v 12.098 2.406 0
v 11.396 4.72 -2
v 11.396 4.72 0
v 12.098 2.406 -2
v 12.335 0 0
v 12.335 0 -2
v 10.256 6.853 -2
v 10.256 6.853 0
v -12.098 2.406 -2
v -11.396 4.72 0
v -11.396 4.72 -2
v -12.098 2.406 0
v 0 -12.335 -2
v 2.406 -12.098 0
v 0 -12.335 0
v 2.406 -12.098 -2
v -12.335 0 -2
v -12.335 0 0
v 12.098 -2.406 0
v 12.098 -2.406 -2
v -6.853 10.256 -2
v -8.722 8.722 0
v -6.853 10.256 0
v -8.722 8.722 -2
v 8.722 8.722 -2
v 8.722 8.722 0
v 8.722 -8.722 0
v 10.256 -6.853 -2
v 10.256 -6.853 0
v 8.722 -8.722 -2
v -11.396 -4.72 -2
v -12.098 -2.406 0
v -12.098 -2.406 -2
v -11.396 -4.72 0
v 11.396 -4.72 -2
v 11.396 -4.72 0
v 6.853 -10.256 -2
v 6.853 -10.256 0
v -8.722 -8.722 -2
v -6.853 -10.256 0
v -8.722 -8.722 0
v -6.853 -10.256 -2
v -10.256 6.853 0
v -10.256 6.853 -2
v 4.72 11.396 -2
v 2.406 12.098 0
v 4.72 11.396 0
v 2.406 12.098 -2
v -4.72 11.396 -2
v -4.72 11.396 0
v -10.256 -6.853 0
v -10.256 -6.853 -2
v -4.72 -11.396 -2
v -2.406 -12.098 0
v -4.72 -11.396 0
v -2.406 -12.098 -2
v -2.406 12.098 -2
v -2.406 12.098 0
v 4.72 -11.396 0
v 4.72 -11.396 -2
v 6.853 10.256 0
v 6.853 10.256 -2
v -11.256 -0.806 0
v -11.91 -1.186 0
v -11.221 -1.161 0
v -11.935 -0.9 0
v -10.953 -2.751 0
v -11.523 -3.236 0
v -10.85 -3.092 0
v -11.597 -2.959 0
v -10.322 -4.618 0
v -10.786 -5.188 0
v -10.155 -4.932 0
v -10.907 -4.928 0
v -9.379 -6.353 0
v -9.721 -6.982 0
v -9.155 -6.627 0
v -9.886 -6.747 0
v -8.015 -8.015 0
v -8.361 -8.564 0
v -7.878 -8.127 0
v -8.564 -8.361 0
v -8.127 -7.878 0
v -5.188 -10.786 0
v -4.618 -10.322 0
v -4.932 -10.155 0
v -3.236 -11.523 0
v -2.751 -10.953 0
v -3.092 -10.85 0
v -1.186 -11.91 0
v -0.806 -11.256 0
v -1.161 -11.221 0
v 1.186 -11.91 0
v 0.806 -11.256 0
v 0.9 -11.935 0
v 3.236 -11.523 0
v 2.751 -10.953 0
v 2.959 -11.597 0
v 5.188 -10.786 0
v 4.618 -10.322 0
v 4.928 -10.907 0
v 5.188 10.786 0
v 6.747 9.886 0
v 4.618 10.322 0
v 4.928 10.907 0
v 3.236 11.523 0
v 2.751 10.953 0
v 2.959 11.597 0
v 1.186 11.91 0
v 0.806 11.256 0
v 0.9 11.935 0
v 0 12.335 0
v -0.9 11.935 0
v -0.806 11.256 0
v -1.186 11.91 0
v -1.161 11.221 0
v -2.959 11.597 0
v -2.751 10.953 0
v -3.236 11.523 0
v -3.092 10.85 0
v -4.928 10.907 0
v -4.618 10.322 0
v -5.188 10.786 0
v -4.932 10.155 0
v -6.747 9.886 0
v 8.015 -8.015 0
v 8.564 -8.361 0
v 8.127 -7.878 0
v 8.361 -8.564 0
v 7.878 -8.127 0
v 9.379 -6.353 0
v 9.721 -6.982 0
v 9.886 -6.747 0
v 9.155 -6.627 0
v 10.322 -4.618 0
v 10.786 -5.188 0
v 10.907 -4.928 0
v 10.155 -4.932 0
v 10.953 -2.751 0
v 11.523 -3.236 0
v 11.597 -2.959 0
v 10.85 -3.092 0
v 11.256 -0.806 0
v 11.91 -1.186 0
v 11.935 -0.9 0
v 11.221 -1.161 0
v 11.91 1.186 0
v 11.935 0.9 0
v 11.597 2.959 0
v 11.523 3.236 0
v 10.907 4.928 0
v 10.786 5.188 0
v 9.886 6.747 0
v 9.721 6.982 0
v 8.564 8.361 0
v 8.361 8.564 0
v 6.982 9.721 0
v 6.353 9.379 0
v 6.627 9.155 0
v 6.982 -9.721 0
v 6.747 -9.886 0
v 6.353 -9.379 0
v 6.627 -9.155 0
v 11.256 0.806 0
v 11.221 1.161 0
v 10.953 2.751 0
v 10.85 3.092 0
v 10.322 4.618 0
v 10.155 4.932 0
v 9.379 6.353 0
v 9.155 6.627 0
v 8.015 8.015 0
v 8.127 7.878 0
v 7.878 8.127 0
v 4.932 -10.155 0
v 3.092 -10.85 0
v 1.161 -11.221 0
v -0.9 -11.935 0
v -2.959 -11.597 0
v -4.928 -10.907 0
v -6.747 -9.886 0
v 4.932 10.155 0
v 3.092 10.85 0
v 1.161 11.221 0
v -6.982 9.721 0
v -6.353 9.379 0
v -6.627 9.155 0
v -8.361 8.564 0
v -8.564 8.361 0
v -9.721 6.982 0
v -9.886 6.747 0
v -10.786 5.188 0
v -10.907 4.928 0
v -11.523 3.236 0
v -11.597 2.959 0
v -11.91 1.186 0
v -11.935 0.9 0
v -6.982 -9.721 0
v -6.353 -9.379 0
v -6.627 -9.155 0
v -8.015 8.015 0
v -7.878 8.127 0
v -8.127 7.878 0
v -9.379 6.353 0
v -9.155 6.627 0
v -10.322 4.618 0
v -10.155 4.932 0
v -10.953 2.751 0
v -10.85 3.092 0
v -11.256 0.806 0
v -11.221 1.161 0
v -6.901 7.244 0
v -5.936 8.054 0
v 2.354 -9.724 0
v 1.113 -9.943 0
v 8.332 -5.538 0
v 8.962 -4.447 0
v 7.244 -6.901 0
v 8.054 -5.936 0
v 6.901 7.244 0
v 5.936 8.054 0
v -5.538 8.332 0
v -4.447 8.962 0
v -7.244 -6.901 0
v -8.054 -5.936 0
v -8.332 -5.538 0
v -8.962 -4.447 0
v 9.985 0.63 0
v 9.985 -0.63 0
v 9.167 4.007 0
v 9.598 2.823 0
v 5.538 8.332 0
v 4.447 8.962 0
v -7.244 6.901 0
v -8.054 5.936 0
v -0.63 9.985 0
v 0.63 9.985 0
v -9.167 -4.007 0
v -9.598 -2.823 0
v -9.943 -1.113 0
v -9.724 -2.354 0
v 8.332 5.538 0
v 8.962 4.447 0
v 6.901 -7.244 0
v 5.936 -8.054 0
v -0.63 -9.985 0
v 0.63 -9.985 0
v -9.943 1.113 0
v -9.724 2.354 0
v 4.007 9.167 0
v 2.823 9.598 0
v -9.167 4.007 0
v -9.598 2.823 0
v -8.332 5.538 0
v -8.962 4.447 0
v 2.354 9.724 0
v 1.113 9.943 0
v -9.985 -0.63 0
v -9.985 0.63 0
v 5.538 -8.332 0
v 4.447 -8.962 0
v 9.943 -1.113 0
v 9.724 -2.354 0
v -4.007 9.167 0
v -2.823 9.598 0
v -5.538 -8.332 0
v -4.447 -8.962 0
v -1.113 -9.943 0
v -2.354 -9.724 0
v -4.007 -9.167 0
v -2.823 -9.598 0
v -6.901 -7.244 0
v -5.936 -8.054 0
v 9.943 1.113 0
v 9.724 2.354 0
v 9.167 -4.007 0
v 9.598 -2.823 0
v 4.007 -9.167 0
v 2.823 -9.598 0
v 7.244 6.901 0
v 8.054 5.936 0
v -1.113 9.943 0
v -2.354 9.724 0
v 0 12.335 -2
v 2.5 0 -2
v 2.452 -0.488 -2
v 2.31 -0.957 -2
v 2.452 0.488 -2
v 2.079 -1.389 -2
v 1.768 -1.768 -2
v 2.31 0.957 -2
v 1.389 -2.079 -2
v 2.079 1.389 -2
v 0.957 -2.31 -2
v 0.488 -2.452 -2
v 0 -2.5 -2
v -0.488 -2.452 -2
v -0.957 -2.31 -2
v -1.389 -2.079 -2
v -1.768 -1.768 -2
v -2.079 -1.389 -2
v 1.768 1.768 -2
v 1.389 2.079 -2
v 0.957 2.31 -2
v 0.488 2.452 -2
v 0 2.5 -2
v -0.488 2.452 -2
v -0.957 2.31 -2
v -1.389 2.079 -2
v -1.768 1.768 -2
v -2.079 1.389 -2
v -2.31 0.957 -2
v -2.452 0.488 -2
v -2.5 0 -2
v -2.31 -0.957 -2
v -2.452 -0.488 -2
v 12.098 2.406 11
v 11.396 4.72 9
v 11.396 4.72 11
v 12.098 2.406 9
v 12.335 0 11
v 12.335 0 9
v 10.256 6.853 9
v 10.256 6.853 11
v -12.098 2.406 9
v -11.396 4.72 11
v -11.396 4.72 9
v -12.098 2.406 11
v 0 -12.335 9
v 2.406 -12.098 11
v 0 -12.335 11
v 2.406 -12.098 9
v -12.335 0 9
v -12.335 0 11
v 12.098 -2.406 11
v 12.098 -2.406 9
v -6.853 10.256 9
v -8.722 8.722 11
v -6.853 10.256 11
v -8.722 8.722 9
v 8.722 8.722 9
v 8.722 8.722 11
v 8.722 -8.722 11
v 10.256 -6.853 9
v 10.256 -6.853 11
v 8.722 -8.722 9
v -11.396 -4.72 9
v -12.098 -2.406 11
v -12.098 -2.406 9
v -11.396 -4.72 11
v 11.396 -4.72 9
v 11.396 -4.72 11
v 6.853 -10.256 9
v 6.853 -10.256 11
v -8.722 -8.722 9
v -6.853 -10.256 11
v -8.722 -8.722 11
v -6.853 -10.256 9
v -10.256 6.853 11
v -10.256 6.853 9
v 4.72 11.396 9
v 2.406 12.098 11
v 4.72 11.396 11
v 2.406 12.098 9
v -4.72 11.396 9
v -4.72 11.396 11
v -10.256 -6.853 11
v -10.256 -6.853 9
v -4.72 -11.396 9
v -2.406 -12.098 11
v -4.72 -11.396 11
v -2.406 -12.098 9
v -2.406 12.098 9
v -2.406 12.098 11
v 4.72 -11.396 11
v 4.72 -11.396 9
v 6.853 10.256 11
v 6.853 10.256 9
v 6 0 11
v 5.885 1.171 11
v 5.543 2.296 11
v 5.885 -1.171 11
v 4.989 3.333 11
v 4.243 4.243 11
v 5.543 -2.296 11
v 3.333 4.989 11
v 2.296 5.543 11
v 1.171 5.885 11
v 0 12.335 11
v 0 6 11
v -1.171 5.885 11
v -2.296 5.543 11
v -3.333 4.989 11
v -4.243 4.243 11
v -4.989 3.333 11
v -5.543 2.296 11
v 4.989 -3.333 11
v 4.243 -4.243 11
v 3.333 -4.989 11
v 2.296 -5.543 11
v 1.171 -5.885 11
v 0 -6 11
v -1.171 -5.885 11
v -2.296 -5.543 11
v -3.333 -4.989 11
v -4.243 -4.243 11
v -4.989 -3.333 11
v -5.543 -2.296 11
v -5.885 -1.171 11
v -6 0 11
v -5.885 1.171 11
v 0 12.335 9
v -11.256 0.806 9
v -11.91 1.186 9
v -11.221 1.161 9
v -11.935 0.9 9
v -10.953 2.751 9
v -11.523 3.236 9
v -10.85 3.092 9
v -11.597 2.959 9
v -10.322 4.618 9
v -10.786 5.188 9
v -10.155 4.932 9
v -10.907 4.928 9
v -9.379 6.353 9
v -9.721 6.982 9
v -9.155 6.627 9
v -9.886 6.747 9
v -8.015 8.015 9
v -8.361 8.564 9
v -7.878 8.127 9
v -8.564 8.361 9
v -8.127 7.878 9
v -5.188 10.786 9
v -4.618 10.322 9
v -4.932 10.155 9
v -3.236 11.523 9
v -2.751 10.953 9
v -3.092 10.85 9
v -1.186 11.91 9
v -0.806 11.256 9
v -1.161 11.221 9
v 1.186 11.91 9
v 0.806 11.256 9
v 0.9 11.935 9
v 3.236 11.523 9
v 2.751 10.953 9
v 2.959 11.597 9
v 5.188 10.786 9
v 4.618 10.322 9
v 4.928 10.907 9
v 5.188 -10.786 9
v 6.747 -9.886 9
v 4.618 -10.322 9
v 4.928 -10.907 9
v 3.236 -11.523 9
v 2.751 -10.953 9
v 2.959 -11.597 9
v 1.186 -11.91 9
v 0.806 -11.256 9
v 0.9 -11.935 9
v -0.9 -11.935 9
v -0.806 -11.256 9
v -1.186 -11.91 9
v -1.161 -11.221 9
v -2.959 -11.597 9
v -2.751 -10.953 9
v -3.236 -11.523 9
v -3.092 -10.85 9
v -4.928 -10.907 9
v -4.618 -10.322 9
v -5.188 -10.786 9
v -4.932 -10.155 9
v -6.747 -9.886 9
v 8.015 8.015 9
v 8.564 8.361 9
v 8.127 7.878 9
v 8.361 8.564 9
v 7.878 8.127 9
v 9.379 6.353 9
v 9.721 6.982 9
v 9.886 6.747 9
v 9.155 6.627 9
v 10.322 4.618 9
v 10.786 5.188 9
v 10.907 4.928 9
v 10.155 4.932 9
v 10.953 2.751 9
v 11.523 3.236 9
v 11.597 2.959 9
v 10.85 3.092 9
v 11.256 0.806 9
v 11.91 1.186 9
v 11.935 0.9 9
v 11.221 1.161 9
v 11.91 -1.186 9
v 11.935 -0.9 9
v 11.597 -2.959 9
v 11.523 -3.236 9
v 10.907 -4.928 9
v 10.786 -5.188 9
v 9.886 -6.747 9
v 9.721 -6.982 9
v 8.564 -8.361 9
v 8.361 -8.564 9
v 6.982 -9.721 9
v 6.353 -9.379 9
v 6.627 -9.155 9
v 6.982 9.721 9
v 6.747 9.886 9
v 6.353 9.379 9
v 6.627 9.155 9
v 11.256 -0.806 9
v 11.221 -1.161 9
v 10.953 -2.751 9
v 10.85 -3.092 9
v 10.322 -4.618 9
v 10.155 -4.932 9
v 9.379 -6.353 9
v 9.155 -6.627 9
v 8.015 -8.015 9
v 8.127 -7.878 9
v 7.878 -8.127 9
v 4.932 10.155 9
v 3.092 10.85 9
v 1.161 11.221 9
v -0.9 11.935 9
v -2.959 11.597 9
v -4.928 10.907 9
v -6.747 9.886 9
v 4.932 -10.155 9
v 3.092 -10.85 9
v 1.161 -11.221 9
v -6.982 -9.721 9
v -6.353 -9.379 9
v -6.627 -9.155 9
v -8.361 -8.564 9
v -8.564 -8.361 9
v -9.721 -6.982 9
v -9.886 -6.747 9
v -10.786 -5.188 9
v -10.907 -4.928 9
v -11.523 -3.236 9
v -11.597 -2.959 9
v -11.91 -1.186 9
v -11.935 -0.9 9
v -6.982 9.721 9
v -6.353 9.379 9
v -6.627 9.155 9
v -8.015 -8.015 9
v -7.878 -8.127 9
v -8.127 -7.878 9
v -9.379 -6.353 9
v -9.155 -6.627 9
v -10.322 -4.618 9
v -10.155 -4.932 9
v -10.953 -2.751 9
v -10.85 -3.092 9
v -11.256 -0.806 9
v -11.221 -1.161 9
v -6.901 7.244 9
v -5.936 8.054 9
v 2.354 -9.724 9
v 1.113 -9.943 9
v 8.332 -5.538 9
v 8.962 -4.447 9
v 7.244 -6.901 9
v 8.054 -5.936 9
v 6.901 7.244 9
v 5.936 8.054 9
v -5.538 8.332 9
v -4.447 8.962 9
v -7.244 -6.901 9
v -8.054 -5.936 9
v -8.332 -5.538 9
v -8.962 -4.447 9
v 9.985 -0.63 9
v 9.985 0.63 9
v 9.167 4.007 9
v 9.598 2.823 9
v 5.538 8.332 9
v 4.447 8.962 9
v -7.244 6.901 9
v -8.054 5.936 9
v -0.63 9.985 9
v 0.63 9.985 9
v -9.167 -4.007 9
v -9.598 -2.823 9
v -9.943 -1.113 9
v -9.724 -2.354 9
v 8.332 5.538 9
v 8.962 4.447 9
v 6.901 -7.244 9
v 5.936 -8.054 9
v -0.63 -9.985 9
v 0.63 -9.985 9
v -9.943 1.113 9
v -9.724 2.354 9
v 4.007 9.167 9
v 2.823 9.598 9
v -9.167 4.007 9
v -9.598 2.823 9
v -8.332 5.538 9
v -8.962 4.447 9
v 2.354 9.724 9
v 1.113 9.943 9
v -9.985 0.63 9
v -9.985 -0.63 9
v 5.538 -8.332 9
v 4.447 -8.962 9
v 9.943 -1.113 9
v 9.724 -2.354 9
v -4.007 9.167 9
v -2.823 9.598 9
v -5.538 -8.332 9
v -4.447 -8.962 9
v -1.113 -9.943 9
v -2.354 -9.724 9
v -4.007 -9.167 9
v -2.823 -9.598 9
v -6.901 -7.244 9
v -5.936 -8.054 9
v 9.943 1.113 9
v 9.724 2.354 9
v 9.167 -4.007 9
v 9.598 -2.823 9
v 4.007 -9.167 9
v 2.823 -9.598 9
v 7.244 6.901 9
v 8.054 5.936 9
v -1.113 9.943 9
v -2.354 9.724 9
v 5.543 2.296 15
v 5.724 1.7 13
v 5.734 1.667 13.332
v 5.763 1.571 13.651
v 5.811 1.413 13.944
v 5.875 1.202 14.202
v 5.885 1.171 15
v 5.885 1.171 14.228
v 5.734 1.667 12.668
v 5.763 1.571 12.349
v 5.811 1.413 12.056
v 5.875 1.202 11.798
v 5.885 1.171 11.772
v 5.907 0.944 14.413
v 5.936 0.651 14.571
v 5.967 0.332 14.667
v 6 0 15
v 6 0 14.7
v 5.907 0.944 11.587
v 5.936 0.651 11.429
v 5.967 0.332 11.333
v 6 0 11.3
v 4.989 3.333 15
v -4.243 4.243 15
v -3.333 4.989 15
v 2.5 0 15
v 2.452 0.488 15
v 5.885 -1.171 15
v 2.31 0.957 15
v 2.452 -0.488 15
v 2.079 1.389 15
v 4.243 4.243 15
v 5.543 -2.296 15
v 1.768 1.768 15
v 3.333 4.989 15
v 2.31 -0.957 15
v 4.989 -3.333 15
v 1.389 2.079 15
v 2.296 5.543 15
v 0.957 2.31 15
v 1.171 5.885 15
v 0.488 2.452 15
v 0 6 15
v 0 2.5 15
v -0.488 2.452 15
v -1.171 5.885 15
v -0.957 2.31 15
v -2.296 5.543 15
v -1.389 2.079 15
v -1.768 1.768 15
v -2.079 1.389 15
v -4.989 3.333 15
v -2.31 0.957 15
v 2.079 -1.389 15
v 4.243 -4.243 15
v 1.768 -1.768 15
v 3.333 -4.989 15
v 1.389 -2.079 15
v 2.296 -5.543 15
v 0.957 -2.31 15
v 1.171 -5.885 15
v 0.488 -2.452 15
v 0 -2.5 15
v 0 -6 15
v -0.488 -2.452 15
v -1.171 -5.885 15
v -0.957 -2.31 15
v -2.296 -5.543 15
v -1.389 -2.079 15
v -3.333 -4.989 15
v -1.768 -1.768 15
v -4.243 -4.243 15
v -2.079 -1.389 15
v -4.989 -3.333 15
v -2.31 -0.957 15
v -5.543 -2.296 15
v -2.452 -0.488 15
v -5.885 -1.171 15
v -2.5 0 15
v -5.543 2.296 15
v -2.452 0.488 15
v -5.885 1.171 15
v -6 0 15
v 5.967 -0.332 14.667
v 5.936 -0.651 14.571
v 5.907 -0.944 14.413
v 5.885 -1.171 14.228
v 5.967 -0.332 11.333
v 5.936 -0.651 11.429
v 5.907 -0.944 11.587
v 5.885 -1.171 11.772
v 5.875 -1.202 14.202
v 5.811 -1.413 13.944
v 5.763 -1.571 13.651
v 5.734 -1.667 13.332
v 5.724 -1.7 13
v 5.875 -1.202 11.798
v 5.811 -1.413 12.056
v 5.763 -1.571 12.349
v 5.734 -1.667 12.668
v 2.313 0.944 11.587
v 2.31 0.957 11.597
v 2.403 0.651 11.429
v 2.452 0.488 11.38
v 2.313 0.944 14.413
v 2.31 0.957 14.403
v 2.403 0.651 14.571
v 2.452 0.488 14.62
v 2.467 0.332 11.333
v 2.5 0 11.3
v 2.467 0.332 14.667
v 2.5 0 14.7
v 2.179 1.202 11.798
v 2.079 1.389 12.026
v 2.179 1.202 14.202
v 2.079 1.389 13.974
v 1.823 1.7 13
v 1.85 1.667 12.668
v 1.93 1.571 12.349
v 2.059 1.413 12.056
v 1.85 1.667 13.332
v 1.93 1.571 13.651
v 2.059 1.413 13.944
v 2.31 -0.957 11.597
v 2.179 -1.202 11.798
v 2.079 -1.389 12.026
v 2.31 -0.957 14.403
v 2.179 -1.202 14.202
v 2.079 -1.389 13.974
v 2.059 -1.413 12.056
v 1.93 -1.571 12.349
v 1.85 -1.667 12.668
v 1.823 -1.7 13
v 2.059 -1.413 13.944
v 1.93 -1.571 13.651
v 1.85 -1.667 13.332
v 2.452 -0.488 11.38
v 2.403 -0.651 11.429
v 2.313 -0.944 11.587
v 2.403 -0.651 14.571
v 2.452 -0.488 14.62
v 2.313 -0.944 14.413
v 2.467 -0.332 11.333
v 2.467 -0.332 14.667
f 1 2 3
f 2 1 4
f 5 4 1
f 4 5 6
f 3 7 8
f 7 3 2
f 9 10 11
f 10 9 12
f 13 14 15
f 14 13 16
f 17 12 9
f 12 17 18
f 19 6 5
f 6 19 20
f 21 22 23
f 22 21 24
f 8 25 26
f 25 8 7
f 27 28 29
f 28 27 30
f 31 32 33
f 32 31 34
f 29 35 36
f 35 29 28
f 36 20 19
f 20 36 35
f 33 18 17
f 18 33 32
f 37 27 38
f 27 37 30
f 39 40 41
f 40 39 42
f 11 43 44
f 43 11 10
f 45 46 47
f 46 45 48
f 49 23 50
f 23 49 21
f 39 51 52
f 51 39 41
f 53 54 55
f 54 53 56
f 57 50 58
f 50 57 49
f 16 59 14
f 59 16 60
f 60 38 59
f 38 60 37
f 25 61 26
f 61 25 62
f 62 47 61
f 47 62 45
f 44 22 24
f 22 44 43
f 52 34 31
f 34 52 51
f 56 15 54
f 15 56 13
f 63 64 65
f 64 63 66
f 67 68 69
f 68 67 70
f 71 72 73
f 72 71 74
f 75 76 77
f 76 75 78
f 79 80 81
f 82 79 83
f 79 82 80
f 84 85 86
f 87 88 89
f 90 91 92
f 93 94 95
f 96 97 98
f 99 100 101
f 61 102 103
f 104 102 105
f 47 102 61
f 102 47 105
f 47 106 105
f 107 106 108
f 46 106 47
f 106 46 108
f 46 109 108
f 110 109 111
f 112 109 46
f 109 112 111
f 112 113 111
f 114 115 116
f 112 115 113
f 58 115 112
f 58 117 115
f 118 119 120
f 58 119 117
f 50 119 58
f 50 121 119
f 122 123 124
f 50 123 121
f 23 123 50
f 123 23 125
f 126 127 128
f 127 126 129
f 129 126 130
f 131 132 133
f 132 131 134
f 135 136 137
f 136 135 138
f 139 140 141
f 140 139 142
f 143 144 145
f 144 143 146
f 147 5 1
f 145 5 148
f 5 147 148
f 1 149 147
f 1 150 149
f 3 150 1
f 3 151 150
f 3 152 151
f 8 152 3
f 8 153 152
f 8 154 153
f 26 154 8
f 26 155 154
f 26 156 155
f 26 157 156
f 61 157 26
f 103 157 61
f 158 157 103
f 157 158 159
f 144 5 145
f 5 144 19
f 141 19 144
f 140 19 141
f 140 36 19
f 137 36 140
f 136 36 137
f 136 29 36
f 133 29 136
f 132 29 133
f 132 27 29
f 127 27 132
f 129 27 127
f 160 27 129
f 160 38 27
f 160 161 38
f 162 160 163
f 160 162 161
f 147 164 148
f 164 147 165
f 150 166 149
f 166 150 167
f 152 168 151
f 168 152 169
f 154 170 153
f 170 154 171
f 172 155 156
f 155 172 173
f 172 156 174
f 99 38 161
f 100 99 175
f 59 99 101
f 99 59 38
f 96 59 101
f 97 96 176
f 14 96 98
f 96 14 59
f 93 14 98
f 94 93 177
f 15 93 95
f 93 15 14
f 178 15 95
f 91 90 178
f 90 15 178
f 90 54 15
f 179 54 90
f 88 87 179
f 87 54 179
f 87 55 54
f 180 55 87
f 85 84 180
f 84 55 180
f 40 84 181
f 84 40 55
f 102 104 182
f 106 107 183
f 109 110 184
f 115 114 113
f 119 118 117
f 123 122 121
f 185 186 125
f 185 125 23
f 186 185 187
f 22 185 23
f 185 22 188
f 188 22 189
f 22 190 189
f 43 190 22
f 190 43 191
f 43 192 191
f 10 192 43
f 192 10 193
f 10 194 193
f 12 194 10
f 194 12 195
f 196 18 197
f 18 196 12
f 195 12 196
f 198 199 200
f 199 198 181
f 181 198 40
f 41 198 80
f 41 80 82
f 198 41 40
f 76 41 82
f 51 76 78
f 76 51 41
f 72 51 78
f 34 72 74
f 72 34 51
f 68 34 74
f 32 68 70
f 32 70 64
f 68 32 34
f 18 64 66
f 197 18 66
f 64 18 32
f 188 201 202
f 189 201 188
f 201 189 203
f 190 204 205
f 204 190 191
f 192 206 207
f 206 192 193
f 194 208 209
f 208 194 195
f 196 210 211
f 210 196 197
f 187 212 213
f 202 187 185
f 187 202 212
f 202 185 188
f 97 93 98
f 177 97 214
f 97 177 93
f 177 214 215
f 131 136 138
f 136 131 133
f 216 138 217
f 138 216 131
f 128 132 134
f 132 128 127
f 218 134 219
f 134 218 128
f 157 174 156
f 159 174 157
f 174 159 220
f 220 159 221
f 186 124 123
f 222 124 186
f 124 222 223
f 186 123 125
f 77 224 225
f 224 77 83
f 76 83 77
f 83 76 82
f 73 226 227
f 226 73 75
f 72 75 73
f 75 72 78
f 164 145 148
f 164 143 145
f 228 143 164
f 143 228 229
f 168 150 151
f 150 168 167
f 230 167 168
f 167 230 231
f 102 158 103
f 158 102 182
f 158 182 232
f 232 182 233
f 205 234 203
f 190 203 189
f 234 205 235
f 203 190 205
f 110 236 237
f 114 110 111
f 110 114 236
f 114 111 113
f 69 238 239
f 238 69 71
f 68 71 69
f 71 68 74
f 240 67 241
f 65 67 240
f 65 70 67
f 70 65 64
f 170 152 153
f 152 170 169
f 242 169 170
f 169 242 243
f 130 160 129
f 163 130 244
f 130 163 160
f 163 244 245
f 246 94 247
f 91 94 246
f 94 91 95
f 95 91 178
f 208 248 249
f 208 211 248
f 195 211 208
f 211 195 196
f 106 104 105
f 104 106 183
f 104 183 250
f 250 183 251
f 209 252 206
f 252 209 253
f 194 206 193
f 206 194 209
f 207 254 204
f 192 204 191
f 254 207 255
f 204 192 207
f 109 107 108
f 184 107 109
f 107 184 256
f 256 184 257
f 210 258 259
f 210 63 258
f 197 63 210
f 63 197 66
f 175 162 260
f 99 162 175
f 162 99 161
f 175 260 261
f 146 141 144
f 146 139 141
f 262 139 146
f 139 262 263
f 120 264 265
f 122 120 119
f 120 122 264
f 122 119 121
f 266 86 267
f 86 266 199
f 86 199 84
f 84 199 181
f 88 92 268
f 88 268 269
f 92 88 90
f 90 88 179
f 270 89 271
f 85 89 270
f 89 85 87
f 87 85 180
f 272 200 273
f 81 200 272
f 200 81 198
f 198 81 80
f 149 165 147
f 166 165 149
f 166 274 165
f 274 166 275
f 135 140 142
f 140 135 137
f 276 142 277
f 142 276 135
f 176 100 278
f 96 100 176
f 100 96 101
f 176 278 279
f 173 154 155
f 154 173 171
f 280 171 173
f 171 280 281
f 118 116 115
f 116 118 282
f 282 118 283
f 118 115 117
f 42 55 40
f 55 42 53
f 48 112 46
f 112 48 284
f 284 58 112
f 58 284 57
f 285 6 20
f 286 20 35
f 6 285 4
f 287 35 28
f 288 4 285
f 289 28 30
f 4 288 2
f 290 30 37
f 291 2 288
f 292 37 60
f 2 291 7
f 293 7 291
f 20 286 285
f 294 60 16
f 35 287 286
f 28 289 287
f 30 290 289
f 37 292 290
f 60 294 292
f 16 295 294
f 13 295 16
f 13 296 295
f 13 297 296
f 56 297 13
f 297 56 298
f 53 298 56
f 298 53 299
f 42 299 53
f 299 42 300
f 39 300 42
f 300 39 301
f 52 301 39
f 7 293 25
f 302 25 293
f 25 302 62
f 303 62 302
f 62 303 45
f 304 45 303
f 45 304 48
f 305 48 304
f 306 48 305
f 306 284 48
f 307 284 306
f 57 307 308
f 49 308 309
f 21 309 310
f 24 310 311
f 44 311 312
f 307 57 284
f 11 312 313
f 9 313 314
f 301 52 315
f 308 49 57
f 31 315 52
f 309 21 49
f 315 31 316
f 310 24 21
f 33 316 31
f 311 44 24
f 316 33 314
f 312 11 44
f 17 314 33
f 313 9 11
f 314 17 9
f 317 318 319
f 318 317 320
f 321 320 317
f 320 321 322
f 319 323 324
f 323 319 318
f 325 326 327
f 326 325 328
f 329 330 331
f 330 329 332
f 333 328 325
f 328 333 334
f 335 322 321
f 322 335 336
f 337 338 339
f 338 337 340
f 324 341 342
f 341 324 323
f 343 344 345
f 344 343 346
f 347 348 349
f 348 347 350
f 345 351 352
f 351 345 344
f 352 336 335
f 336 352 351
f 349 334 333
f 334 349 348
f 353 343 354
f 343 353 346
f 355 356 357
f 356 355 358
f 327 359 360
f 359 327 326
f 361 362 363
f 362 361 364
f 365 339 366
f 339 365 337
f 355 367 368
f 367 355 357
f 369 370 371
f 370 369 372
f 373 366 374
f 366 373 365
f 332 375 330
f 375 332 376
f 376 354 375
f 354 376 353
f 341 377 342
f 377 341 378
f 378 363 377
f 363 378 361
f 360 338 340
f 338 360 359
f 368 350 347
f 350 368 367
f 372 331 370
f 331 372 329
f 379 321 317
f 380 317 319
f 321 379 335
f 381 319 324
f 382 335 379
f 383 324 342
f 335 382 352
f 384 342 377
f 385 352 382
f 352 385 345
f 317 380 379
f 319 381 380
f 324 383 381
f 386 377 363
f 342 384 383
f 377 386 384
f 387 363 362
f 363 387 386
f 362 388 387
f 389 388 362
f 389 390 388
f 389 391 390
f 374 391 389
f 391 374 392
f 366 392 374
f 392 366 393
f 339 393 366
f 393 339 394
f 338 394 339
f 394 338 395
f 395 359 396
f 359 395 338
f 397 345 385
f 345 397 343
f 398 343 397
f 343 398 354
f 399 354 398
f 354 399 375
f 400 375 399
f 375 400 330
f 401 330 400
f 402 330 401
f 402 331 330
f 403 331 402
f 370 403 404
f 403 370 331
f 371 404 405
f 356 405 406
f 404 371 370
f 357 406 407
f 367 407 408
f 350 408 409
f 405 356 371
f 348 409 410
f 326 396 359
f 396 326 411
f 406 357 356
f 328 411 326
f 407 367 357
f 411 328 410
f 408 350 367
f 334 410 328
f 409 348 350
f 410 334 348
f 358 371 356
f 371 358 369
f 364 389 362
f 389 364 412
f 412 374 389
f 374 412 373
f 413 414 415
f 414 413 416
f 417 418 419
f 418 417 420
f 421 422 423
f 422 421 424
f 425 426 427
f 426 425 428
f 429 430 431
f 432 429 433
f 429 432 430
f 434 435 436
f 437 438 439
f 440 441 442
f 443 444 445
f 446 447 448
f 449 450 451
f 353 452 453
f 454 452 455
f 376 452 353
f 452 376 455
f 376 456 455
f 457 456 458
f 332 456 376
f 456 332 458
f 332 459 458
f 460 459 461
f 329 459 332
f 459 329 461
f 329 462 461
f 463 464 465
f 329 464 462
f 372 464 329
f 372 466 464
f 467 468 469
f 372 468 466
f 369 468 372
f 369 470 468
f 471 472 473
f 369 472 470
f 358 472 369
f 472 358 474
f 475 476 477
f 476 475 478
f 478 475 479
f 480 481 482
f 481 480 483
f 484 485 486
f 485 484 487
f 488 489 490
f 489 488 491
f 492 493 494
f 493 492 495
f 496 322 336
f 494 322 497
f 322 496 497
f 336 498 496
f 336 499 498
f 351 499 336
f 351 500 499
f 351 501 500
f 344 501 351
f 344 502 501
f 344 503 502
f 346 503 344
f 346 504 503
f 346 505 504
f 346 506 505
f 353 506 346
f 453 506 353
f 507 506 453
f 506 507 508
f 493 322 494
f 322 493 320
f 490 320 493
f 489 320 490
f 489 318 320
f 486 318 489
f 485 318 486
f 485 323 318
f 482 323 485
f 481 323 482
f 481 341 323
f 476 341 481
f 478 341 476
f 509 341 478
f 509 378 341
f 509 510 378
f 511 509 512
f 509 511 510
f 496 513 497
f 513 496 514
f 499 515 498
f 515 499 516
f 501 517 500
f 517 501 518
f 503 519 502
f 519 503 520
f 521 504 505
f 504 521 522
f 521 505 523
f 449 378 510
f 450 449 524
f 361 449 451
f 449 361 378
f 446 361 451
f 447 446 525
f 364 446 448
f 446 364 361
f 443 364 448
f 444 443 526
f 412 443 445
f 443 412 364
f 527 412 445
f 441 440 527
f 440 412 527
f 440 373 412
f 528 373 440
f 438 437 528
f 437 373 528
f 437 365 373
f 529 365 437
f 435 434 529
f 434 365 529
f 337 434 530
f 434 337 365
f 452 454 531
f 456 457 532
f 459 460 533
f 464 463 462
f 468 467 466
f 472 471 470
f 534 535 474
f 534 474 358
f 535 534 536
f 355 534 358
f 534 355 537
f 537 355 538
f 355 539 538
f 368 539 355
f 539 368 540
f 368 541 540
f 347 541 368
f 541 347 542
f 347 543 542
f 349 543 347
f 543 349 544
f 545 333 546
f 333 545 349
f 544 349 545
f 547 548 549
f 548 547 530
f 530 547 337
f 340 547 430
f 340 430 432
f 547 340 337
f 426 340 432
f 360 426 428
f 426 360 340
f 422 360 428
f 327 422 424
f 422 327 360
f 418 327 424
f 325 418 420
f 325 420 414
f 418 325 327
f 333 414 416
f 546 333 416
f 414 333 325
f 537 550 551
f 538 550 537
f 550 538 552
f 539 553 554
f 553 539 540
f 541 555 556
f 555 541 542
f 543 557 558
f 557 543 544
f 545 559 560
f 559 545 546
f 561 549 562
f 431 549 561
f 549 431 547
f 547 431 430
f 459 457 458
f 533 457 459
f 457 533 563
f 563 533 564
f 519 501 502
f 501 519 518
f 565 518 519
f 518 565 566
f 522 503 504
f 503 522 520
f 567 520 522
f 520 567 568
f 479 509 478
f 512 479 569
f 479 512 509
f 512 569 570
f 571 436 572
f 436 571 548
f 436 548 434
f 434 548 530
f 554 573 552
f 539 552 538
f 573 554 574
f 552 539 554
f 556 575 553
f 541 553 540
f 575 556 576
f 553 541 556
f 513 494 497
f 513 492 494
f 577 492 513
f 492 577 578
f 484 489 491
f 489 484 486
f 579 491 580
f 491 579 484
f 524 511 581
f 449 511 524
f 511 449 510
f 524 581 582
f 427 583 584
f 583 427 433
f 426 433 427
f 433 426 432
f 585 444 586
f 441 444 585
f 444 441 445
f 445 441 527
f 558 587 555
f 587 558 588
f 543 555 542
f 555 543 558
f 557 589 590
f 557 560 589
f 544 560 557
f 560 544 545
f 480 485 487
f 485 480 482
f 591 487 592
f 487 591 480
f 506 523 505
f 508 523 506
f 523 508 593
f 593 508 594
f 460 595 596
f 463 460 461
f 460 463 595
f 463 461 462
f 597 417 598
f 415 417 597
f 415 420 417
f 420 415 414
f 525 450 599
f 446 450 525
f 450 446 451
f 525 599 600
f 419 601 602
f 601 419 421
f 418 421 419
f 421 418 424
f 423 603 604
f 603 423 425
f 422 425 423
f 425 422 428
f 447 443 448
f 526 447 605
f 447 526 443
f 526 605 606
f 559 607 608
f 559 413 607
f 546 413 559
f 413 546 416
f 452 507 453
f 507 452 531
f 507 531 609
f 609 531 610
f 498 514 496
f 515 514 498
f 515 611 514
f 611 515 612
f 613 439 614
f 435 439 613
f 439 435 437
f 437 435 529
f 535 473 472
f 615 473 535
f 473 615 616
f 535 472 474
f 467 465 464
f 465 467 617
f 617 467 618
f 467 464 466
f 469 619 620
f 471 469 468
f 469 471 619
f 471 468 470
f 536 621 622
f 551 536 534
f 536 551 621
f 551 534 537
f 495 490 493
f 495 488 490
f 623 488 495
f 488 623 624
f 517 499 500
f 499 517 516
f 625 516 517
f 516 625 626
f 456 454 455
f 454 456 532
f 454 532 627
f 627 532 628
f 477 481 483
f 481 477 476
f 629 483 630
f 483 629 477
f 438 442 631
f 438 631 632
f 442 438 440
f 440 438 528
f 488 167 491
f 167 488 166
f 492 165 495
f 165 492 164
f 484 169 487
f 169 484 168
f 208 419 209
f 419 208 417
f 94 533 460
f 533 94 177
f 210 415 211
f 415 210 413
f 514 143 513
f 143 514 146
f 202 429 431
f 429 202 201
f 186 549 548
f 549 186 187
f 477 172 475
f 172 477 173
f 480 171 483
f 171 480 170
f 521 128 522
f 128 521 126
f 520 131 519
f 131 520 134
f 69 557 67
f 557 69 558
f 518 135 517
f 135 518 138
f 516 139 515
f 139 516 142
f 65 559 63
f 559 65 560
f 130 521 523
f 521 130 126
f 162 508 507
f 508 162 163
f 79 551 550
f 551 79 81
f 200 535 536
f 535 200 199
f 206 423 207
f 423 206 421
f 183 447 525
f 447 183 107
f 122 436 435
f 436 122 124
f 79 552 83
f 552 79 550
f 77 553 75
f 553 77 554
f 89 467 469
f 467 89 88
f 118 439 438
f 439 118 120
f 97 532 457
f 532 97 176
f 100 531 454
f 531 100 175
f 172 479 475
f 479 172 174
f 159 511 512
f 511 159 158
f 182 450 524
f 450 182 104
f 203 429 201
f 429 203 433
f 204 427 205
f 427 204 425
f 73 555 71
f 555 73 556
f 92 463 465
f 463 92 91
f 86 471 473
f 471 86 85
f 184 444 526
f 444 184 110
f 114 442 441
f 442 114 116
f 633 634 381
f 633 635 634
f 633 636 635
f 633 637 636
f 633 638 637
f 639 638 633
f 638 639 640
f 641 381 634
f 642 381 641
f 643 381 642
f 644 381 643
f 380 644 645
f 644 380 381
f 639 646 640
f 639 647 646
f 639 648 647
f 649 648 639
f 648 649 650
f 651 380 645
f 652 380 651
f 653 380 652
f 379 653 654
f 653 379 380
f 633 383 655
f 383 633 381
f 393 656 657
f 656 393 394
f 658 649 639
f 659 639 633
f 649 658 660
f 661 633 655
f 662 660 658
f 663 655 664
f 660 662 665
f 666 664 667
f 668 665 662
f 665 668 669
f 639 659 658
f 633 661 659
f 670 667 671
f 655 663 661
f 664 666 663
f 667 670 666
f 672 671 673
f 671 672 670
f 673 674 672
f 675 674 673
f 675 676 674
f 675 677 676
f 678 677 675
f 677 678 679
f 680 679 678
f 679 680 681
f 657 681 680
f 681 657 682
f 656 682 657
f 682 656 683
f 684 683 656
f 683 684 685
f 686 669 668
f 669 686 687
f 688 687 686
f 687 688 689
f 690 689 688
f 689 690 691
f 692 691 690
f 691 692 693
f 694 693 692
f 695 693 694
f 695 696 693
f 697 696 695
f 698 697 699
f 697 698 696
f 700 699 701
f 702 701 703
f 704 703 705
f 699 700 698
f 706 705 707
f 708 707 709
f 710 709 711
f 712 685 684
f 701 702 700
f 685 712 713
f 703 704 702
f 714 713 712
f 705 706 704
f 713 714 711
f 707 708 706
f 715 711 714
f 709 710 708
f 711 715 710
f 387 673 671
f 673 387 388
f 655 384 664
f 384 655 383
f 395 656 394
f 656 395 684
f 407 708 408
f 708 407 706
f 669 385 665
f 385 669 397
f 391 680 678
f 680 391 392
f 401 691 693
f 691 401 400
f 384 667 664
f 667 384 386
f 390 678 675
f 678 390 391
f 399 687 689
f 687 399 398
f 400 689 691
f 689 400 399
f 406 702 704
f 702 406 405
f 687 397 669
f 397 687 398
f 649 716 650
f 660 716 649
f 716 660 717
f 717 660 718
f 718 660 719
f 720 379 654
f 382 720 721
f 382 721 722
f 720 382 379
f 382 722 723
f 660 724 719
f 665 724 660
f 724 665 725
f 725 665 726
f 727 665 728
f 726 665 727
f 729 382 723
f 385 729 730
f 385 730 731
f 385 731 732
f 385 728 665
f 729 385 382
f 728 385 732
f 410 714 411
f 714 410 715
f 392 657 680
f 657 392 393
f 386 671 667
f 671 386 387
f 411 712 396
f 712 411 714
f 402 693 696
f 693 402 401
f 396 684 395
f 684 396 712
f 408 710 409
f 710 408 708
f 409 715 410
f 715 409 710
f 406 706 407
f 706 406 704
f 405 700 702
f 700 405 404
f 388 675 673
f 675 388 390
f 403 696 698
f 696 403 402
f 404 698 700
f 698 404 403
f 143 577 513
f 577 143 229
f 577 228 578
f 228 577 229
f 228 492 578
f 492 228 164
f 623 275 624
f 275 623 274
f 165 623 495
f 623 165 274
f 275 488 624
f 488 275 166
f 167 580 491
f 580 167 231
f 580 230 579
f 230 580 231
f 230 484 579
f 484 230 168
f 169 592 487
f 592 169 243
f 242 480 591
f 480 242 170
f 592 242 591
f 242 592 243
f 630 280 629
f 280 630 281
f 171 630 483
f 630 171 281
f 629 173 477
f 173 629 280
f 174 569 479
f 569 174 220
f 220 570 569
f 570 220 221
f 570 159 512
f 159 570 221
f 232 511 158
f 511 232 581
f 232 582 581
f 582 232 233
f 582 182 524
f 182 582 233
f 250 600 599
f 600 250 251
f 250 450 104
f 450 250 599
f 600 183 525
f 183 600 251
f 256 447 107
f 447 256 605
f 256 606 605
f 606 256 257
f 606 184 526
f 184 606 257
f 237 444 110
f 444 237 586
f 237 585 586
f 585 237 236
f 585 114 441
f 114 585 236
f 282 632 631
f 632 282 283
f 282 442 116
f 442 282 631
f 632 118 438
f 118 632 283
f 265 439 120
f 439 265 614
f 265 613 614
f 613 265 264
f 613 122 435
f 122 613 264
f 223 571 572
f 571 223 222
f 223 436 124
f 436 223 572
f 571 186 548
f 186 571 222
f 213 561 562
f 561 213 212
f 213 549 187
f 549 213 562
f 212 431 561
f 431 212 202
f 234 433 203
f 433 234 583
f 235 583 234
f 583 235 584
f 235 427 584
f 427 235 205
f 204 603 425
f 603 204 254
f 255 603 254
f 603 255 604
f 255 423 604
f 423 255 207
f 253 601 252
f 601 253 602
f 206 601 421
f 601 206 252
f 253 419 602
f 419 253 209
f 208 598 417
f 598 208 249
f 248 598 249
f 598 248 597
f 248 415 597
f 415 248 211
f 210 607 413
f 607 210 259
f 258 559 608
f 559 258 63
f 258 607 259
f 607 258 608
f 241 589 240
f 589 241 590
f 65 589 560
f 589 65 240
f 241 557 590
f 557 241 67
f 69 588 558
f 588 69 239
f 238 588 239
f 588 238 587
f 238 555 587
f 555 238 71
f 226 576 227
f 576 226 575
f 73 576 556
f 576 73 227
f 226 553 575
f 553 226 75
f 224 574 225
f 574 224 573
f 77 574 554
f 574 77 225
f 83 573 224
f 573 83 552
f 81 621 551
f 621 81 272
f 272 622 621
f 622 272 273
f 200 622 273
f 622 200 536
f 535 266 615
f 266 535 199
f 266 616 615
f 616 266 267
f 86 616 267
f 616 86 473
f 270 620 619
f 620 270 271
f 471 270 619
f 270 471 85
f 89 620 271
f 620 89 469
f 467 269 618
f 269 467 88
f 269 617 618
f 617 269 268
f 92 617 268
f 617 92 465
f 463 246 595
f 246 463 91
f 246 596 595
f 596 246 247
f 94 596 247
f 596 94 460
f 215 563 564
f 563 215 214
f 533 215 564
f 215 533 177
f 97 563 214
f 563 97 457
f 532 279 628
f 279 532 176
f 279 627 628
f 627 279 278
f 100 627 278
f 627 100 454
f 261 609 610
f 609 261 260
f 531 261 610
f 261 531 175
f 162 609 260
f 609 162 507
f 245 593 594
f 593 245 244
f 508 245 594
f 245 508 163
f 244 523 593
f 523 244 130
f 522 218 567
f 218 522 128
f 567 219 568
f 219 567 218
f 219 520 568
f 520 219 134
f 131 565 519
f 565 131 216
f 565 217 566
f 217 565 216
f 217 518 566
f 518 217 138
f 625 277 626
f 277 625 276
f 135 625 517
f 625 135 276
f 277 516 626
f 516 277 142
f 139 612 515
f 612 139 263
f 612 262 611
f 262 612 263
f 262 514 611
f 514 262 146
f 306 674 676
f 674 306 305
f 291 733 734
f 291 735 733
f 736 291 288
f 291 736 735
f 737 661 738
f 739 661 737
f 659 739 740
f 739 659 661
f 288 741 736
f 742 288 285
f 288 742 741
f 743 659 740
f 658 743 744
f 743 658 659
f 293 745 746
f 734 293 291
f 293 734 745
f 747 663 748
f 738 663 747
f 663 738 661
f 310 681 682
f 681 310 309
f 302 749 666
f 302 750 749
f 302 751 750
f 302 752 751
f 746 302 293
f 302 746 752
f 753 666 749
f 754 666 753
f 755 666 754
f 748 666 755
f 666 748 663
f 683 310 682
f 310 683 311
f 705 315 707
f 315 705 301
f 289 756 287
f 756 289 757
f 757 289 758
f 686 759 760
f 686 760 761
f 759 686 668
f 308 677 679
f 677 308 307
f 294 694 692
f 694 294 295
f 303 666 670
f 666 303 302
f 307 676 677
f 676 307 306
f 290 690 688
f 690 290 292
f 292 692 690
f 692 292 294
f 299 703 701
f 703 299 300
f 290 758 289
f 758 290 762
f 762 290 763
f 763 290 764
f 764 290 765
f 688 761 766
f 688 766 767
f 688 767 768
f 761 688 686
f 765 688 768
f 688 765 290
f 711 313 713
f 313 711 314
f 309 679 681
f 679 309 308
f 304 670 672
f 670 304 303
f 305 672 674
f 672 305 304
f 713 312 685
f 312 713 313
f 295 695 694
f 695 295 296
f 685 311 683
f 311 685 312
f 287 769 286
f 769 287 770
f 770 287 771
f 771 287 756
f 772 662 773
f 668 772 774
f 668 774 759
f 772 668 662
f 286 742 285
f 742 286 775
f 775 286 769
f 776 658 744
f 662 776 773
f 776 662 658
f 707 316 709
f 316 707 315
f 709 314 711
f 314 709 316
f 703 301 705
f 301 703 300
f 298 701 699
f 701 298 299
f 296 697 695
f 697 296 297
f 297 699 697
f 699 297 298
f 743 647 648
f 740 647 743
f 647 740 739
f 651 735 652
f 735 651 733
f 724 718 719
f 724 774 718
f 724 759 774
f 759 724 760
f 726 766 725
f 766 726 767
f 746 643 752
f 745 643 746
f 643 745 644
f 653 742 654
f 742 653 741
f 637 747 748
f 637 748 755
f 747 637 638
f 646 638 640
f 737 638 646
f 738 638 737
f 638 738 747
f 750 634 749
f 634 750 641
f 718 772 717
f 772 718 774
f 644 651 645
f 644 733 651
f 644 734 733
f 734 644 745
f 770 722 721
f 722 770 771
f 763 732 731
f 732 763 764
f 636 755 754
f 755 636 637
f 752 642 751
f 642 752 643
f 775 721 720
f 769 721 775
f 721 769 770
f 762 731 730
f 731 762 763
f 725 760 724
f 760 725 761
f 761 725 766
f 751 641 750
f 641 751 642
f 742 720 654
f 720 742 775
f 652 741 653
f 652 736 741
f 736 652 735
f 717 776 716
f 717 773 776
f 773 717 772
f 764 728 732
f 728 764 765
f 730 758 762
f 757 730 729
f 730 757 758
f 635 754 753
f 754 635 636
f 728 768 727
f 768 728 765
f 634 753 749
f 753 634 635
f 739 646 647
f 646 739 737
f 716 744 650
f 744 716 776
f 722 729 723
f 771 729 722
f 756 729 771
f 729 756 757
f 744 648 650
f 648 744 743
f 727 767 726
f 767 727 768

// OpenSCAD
$fn = 32;

// ----------------------------------------------------------------------
// Timing pulley: GT2 36T, pitch 2 mm, 24.67 mm x 17 mm
// ----------------------------------------------------------------------

// --- parameters (mm) ---
belt_pitch = 2;           // belt pitch
n_teeth = 36;             // number of grooves
rim_w = 9;                // belt width between the flanges
tip_d = 22.67;            // tip circle diameter
root_d = 21.17;           // groove bottom diameter
groove_h = 0.75;          // groove depth
tooth_w = 1.5;            // groove width at the tip circle
rim_d = 24.67;            // flange diameter
rim_t = 2;                // flange thickness
spigot_d = 19.57;         // flange spigot, sunk into the rim
spigot_h = 1.2;           // spigot depth into the rim
shaft_d = 5;              // shaft bore
hub_d = 12;               // hub diameter
hub_h = 4;                // hub above the flange
bottom_z = -2;            // lowest point of the pulley
top_z = 15;               // highest point of the pulley
set_d = 3.4;              // set screw tap hole

module rim() {
  cylinder(h = rim_w, d = tip_d);
}

module groove_cutter() {
  /* belt tooth groove: deeper than wide, cut through the belt width */
  translate([root_d / 2, 0, 0])
    linear_extrude(height = rim_w)
      polygon(points = [[-0.6, -tooth_w * 0.42], [groove_h + 0.6, -tooth_w * 0.6],
                        [groove_h + 0.6, tooth_w * 0.6], [-0.6, tooth_w * 0.42]]);
}

module flanges() {
  translate([0, 0, -rim_t]) cylinder(h = rim_t, d = rim_d);
  translate([0, 0, rim_w]) cylinder(h = rim_t, d = rim_d);
  translate([0, 0, -spigot_h]) cylinder(h = spigot_h + 0.6, d = spigot_d);
  translate([0, 0, rim_w - 0.6]) cylinder(h = spigot_h + 0.6, d = spigot_d);
}

module hub() {
  translate([0, 0, bottom_z]) cylinder(h = top_z - bottom_z, d = hub_d);
}

difference() {
  union() {
    rim();
    hub();
    flanges();
  }
  for (i = [0 : n_teeth - 1]) rotate([0, 0, i * 360 / n_teeth]) groove_cutter();
  translate([0, 0, bottom_z - 1]) cylinder(h = top_z - bottom_z + 2, d = shaft_d);
  translate([-1, 0, top_z - hub_h * 0.5]) rotate([0, 90, 0]) cylinder(h = hub_d / 2 + 3, d = set_d);
}
